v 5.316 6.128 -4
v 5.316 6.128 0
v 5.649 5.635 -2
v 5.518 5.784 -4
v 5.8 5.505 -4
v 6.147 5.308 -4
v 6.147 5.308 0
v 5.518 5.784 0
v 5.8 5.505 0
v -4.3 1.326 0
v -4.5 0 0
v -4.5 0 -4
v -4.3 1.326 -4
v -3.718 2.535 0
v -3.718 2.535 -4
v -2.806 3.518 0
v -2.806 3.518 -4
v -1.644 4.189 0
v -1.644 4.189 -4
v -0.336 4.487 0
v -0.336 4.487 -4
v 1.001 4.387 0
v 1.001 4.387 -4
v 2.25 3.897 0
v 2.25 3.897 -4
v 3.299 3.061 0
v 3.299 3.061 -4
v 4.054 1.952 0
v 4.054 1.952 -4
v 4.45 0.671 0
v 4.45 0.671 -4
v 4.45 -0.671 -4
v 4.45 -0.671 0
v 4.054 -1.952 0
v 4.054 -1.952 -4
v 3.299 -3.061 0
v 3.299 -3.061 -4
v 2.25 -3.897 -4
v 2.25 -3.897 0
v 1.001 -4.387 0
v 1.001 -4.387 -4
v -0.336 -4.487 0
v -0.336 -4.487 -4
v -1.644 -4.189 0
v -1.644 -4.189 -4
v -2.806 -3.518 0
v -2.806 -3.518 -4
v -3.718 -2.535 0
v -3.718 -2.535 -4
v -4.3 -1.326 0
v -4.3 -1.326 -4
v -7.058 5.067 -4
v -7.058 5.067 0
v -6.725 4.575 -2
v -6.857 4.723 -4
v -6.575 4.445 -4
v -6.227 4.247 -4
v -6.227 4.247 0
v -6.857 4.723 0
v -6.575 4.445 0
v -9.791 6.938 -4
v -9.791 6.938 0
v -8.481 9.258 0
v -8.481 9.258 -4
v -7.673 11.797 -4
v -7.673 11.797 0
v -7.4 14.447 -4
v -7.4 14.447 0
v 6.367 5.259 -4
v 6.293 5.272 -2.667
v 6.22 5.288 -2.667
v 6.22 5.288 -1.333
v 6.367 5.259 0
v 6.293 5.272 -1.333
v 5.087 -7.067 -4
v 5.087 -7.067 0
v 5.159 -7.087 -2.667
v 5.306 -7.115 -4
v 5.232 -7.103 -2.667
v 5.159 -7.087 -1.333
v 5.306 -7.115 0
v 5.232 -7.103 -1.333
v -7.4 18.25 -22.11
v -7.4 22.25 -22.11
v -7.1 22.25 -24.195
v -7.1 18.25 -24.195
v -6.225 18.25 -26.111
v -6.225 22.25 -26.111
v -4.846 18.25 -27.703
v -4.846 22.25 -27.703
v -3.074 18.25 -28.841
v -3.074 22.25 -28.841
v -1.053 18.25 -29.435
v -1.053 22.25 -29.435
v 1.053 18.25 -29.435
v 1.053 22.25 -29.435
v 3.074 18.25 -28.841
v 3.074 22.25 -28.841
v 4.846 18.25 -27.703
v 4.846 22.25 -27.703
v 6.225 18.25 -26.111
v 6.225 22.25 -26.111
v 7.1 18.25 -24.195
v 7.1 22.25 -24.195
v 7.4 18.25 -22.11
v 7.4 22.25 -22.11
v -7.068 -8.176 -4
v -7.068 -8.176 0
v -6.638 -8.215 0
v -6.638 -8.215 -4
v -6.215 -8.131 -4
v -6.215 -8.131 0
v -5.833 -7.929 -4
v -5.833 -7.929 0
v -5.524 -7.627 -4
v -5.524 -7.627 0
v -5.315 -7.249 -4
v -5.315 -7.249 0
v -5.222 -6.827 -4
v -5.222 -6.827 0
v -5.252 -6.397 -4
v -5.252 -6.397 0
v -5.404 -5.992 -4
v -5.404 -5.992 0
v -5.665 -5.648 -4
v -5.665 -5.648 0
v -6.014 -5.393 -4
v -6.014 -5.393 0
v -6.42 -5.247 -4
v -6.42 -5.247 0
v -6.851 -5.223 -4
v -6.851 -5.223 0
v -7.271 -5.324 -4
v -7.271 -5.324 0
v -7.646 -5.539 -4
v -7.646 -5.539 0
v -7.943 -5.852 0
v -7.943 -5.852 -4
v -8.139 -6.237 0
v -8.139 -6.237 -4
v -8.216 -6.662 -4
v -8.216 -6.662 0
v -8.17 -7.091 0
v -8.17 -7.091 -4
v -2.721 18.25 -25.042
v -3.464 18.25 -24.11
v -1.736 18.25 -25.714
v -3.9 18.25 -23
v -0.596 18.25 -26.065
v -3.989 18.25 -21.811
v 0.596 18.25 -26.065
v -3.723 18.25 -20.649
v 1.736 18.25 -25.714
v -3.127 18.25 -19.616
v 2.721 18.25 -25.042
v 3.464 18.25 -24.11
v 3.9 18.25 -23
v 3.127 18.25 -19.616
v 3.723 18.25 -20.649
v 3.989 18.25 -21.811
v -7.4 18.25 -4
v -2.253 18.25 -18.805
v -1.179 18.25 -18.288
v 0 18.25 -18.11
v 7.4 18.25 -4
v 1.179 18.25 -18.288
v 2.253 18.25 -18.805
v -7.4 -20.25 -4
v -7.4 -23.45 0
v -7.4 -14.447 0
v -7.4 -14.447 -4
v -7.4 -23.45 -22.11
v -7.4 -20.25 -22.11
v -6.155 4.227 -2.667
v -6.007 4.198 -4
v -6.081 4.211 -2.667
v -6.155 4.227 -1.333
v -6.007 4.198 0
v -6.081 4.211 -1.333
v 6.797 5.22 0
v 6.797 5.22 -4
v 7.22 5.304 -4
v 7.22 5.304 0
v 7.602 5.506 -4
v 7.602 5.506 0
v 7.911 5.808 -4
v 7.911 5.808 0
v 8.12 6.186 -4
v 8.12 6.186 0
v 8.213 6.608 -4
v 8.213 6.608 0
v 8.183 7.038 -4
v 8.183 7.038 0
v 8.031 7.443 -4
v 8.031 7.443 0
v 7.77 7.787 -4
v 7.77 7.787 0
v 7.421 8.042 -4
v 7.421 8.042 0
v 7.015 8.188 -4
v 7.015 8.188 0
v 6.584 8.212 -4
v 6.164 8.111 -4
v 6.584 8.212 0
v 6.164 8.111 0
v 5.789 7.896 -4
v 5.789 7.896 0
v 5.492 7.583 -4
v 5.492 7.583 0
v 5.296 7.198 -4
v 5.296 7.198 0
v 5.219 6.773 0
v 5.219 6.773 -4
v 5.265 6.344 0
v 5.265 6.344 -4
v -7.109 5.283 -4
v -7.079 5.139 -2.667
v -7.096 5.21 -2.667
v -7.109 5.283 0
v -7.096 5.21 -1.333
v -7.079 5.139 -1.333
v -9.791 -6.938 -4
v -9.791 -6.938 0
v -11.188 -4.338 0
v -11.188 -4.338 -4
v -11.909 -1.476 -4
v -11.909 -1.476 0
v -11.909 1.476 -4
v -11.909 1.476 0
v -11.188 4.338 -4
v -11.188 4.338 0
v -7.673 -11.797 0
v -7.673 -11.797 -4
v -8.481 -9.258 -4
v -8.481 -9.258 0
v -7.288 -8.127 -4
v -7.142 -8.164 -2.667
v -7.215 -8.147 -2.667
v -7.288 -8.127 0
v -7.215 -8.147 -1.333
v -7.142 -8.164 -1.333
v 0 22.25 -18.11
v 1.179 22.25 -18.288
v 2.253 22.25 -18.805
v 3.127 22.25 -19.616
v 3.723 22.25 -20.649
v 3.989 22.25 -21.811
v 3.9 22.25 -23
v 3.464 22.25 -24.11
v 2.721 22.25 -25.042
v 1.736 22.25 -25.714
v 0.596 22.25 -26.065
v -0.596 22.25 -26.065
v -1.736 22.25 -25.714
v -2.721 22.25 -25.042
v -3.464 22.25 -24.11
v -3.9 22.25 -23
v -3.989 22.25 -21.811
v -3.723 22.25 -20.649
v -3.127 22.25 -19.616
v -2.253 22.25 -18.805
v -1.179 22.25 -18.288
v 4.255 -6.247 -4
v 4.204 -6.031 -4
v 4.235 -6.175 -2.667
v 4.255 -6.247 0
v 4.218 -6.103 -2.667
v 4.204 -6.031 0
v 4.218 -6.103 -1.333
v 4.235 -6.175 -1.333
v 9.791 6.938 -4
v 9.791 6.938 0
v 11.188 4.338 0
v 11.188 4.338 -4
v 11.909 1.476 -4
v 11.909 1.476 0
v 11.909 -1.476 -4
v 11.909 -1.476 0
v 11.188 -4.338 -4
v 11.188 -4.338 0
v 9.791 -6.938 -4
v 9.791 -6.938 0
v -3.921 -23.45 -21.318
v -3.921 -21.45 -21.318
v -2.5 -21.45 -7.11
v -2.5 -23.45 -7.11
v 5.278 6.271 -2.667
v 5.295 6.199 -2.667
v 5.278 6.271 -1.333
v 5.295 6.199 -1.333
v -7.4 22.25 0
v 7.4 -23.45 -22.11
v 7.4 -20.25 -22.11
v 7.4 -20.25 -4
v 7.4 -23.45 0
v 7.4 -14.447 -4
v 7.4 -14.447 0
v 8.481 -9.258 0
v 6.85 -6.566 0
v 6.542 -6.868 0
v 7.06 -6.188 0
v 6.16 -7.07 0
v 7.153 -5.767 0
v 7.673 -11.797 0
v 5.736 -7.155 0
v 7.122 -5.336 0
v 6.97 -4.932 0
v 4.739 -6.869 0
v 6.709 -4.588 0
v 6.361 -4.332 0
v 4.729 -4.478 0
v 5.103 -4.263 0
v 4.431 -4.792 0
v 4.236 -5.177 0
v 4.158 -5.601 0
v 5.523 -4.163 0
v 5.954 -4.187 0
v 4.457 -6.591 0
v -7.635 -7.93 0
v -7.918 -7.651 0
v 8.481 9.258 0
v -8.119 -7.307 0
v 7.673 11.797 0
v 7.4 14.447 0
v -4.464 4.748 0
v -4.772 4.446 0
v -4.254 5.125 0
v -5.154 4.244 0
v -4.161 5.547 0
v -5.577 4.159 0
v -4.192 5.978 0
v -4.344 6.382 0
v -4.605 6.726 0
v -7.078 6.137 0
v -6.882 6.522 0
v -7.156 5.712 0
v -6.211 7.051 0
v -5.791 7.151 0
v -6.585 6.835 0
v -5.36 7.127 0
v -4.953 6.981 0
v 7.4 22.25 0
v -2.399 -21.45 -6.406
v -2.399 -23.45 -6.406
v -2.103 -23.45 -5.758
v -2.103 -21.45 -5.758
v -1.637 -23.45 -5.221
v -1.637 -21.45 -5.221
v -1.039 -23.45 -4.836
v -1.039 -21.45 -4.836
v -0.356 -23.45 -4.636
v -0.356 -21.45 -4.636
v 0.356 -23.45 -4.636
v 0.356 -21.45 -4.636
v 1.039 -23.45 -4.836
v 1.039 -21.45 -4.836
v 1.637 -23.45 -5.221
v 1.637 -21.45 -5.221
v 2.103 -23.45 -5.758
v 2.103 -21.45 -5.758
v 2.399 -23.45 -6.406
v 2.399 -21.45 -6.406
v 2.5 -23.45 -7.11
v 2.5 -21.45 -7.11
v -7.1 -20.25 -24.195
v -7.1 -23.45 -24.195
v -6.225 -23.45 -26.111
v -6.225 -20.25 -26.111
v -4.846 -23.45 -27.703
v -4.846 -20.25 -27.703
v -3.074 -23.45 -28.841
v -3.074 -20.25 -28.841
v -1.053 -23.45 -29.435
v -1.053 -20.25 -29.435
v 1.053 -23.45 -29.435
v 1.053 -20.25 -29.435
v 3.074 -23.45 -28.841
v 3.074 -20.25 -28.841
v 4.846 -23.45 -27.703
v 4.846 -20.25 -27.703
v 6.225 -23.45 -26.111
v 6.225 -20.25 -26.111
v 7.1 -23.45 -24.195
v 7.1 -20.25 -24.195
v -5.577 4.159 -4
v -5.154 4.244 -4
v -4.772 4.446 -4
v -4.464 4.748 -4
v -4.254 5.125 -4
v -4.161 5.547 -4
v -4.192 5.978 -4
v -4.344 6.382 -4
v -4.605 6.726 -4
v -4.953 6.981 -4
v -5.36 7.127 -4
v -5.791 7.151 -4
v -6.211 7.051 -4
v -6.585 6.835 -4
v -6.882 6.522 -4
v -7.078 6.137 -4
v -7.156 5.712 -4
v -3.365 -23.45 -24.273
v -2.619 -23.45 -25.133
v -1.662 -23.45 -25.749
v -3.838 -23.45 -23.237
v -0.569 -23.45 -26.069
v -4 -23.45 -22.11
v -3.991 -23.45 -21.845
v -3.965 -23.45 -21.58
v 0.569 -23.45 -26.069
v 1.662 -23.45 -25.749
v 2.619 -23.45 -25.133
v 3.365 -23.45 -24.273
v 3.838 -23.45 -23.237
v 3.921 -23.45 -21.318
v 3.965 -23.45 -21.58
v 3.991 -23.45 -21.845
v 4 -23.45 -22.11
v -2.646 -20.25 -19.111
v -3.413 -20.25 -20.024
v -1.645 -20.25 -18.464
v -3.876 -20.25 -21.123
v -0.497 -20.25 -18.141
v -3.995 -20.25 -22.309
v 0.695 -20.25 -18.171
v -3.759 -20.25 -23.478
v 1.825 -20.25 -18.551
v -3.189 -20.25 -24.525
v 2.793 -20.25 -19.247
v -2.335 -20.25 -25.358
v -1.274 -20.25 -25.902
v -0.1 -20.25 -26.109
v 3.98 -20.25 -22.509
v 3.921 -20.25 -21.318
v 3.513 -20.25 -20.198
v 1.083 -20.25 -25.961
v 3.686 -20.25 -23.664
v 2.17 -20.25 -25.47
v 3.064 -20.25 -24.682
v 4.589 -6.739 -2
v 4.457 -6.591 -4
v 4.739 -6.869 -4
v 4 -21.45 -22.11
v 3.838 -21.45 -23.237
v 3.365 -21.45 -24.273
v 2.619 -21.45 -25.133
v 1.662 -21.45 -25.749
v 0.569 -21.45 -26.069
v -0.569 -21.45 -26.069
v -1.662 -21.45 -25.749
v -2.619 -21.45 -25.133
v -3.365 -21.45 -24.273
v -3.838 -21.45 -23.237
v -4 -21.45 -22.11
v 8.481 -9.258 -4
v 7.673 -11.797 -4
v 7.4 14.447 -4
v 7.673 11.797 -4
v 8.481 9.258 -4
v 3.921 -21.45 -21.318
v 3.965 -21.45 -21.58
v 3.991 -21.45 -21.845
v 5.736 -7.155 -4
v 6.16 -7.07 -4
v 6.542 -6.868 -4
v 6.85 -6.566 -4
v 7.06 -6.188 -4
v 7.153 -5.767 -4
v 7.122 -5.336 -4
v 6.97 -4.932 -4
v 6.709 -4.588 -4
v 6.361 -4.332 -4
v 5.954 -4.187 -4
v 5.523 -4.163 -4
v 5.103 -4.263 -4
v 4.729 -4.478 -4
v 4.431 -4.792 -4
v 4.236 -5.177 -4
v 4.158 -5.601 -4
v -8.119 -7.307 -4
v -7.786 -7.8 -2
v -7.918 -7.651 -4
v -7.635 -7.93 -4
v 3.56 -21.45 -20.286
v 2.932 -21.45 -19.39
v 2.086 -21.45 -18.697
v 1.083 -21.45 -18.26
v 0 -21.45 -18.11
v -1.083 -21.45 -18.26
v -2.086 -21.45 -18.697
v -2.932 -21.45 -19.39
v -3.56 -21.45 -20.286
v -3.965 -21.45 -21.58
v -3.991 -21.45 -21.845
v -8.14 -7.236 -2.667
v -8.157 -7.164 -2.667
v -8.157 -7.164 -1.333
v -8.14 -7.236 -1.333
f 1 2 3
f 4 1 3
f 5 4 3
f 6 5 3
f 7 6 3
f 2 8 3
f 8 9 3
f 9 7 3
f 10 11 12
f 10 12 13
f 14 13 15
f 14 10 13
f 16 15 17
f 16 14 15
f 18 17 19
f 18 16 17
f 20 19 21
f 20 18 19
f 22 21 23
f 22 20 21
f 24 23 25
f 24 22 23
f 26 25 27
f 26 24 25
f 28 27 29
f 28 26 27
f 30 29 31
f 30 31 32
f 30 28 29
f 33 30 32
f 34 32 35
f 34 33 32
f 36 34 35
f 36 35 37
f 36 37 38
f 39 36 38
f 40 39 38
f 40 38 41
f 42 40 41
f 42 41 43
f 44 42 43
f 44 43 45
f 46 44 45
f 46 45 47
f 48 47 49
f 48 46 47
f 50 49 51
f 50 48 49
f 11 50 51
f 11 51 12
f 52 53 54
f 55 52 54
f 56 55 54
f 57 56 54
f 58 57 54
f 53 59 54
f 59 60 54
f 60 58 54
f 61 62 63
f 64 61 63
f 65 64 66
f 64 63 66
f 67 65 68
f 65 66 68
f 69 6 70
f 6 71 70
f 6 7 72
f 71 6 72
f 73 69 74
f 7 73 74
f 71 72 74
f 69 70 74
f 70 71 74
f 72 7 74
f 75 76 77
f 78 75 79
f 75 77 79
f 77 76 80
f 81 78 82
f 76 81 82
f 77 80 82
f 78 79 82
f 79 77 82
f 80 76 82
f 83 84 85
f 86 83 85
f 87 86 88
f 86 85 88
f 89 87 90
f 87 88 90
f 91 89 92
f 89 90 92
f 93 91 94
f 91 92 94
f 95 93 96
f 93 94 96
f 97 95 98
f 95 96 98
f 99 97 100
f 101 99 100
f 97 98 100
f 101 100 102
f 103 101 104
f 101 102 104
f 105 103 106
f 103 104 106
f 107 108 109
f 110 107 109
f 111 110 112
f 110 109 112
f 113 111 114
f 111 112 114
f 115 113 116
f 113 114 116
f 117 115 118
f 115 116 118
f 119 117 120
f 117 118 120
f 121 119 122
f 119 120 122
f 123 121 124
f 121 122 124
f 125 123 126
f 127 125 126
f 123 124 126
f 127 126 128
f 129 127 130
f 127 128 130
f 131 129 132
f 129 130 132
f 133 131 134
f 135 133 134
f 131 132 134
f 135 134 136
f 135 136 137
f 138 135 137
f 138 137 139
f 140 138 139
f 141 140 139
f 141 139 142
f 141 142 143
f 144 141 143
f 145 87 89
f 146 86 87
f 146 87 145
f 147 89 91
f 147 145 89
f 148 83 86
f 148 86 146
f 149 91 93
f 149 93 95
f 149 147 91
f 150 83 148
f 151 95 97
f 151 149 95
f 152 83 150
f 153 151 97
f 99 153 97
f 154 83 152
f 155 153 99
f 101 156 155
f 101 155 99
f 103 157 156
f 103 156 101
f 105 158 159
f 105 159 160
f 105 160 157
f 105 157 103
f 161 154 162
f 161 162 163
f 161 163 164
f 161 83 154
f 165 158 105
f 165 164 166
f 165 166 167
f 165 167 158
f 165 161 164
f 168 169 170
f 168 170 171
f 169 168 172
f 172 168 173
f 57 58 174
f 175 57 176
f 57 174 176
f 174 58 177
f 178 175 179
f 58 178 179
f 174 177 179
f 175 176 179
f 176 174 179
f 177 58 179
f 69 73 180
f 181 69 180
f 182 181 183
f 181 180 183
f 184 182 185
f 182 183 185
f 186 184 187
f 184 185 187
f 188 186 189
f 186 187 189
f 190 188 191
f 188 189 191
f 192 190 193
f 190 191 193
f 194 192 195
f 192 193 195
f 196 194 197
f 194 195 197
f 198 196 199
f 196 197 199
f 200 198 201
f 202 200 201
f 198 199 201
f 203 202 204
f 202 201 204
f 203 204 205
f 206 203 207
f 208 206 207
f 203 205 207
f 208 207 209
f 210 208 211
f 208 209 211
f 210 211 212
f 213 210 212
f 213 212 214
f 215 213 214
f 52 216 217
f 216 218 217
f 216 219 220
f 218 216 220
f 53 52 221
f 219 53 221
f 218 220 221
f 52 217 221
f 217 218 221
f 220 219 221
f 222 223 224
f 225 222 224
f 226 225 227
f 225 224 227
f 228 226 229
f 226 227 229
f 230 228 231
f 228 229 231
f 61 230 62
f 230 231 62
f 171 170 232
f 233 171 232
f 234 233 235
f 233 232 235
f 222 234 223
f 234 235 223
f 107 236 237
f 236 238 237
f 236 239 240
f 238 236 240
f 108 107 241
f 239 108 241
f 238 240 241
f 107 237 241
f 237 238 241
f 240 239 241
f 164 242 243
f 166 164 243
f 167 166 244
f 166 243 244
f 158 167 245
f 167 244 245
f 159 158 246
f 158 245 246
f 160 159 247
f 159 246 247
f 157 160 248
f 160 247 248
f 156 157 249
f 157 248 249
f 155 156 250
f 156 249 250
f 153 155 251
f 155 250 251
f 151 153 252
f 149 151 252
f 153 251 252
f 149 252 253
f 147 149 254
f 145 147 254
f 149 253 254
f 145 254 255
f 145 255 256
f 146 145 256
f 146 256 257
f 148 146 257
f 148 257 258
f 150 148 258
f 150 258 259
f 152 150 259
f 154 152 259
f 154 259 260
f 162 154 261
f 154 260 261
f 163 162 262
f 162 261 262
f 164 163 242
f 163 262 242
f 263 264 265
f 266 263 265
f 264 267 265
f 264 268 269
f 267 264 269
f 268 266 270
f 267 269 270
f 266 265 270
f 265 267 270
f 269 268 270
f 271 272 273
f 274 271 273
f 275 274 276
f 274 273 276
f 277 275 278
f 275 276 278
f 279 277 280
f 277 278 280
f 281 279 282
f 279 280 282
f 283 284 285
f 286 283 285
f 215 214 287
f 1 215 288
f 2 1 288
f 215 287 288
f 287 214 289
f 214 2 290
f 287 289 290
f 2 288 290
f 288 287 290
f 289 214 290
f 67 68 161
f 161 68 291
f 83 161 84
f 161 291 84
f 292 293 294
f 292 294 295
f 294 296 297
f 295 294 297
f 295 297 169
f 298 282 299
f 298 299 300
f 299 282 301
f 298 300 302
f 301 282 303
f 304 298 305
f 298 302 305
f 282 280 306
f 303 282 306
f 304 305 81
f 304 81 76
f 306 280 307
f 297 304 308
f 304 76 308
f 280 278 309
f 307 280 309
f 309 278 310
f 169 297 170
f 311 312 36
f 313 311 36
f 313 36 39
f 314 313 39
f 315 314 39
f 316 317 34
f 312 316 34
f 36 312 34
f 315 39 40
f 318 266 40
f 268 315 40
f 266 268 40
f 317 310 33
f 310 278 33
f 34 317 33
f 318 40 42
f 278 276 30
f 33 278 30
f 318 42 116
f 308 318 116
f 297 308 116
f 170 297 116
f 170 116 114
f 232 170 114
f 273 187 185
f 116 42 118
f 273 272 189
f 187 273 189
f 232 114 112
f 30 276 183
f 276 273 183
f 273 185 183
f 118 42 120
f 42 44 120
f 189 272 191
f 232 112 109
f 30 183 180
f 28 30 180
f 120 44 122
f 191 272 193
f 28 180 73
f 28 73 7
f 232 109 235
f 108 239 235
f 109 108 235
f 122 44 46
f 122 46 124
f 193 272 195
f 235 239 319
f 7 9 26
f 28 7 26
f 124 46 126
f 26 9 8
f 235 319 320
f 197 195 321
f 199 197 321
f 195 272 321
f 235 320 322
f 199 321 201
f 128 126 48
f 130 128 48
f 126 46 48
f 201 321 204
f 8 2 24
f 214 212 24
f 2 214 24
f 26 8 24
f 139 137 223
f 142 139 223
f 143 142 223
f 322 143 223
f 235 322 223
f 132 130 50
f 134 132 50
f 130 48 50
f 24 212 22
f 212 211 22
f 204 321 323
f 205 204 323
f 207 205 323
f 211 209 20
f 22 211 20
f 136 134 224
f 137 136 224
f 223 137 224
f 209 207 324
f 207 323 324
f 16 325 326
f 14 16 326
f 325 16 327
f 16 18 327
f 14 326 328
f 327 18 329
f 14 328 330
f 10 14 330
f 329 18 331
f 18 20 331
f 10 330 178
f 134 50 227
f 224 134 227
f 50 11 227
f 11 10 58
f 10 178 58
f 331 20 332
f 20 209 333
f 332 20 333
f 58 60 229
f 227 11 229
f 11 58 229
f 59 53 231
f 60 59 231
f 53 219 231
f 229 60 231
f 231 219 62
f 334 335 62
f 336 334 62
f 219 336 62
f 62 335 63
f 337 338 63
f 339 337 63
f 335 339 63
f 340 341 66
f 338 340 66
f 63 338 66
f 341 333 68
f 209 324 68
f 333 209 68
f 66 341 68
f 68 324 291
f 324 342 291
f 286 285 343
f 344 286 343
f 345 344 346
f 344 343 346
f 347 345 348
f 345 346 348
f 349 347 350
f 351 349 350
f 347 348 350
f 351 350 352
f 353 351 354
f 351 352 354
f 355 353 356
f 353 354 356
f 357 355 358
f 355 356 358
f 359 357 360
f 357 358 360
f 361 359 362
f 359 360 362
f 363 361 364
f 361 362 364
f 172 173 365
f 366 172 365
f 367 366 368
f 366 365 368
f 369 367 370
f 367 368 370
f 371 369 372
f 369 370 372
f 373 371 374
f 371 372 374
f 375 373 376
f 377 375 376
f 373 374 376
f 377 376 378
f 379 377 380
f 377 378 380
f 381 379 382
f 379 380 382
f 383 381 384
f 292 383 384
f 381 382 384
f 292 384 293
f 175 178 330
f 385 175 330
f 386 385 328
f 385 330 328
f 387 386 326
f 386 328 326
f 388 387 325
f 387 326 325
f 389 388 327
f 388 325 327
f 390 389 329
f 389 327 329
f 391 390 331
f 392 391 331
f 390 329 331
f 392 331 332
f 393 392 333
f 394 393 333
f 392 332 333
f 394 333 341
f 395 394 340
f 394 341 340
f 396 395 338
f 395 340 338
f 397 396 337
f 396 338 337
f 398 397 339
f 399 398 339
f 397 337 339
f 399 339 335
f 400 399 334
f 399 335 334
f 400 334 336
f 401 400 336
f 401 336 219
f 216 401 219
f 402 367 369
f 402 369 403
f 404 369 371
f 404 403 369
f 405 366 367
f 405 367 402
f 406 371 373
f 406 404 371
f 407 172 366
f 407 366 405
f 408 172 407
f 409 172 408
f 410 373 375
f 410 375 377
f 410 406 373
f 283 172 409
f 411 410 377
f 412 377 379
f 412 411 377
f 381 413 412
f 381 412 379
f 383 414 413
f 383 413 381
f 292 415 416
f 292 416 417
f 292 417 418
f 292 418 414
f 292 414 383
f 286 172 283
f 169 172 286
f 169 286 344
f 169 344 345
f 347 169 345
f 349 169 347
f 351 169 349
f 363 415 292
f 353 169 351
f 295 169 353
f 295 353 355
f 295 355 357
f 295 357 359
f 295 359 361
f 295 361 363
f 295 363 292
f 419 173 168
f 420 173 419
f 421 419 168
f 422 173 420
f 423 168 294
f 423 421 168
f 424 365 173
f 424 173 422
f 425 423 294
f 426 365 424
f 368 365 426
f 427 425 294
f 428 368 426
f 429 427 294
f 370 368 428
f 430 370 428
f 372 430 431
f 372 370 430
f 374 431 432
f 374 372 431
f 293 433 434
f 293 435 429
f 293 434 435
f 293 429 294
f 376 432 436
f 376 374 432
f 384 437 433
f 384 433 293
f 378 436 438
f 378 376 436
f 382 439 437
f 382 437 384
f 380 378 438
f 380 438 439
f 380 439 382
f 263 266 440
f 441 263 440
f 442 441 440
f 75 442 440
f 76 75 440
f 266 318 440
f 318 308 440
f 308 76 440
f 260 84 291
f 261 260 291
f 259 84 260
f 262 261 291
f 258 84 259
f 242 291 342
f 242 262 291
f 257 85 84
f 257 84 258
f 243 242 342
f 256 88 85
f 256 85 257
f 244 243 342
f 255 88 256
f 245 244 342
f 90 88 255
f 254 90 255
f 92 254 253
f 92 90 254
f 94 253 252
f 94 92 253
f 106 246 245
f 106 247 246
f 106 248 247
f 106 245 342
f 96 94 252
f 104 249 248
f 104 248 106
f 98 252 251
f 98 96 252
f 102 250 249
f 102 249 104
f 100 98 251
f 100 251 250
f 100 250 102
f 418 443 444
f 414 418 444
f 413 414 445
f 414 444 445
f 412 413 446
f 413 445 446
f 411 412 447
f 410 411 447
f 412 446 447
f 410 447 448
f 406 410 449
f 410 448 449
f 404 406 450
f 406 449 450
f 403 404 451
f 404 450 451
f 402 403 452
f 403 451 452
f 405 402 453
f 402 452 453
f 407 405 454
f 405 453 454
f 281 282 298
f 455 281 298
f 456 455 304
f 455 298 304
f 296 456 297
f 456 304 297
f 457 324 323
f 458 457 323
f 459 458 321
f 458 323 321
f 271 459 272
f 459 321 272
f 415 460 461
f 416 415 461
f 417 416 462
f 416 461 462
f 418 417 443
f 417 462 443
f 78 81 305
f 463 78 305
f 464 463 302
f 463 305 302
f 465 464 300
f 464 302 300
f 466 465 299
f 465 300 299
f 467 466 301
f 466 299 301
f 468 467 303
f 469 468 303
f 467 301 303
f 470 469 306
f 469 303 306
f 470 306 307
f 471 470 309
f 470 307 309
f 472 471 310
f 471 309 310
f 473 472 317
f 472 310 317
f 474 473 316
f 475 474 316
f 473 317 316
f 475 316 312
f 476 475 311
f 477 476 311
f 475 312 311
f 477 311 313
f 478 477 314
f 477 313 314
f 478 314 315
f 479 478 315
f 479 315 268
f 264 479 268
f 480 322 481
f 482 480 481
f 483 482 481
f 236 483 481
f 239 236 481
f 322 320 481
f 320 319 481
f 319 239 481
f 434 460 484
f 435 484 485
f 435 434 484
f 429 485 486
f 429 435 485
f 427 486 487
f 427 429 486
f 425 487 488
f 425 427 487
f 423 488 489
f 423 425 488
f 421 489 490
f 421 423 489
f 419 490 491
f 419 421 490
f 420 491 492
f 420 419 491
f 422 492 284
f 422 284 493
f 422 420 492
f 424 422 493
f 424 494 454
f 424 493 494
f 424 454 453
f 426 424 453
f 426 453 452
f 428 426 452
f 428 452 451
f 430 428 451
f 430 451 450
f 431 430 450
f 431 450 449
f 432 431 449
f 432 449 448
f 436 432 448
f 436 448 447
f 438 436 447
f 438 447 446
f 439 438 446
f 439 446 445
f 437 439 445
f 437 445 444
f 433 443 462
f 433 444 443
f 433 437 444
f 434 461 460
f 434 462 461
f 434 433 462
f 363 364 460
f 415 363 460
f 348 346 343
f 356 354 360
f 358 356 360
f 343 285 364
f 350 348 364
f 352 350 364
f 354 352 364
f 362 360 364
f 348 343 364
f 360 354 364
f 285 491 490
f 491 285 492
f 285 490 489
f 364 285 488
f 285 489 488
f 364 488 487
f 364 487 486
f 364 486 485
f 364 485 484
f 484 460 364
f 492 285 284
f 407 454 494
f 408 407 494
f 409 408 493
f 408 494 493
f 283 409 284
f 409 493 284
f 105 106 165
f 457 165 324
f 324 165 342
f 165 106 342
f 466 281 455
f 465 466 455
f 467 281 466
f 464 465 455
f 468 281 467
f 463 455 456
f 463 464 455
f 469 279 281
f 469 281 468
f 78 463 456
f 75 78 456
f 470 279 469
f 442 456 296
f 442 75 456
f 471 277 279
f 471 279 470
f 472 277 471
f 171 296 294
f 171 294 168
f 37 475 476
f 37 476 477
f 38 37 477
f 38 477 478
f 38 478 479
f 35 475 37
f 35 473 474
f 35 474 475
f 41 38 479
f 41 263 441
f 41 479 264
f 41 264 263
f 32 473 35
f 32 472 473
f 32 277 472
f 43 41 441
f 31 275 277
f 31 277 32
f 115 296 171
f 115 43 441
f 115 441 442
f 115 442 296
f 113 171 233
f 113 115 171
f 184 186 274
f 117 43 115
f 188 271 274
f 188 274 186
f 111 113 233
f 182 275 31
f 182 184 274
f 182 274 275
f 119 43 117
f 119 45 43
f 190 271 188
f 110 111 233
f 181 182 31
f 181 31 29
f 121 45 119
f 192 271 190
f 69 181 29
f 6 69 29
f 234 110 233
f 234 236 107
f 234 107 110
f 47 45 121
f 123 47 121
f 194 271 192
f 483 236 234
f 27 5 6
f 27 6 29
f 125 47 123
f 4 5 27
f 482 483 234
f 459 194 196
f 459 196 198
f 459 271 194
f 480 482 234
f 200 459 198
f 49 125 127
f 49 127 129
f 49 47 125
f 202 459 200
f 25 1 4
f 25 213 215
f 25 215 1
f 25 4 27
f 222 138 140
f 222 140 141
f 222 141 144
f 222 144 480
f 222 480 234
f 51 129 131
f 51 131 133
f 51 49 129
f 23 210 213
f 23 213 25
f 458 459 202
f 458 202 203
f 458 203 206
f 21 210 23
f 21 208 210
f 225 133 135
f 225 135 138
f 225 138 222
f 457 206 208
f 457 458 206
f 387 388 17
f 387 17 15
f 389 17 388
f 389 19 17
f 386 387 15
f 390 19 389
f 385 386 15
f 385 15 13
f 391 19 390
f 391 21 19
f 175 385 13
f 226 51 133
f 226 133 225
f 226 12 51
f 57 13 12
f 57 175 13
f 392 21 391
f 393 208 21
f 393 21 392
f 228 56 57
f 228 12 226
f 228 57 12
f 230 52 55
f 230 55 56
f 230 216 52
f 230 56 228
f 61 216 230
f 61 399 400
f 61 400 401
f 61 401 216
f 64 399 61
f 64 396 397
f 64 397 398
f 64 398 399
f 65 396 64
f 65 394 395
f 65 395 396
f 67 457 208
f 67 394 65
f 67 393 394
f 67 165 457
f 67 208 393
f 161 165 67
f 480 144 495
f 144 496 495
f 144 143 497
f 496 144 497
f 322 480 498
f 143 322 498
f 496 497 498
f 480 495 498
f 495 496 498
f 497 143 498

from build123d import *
from build123d.topology import SkipClean

# Parameters (mm, degrees)
BOSS_EXTRUDE1_OUTLINE_R = 4.5
BOSS_EXTRUDE1_DEPTH     = 4
BOSS_EXTRUDE2_START     = -2
BOSS_EXTRUDE2_DEPTH     = 1.2
BOSS_EXTRUDE3_DEPTH     = 2
BOSS_EXTRUDE4_DEPTH     = 2
BOSS_EXTRUDE5_DEPTH     = 2
CUT_EXTRUDE3_DEPTH      = 1.2
SKETCH12_R              = 4
CUT_EXTRUDE4_DEPTH      = 4
SKETCH8_R               = 1.5
CUT_EXTRUDE1_DEPTH      = 56.707591784
CUT_EXTRUDE2_START      = -15
SKETCH9_R               = 4
CUT_EXTRUDE2_DEPTH      = 15


# Read off the part's stored shape, not the designer's step: Boss-Extrude1
with BuildPart() as part:
    # Boss-Extrude1 outline → Boss-Extrude1 (new body)
    with BuildSketch(Plane(origin=(0, 0, 0), x_dir=(-1, 0, 0), z_dir=(0, 0, -1))):
        with BuildLine():
            Line((-7.4, 23.45), (-7.4, 14.446692543))
            ThreePointArc((-7.4, 14.446692543), (-8.012107067, 10.506844717), (-9.790721745, 6.938426891))
            ThreePointArc((-9.790721745, 6.938426891), (-12, 0), (-9.790721745, -6.938426891))
            ThreePointArc((-9.790721745, -6.938426891), (-8.012107067, -10.506844717), (-7.4, -14.446692543))
            Line((-7.4, -14.446692543), (-7.4, -23.45))
            Line((-7.4, -23.45), (7.4, -23.45))
            Line((7.4, -23.45), (7.4, -14.446692543))
            ThreePointArc((7.4, -14.446692543), (8.012107067, -10.506844717), (9.790721745, -6.938426891))
            ThreePointArc((9.790721745, -6.938426891), (12, 0), (9.790721745, 6.938426891))
            ThreePointArc((9.790721745, 6.938426891), (8.012107067, 10.506844717), (7.4, 14.446692543))
            Line((7.4, 14.446692543), (7.4, 23.45))
            Line((7.4, 23.45), (-7.4, 23.45))
        make_face()
        with BuildLine():
            add(Edge.make_bspline(
                [(-5.08661691, -7.066518716), (-5.158505421, -7.088491281), (-5.232048751, -7.104749218), (-5.306303966, -7.11531731)],
                knots=[0, 0, 0, 0, 0.301273824, 0.301273824, 0.301273824, 0.301273824], degree=3))
            ThreePointArc((-5.306303966, -7.11531731), (-6.708944151, -4.587692504), (-4.204222203, -6.030833041))
            add(Edge.make_bspline(
                [(-4.204222203, -6.030833041), (-4.215901752, -6.103480441), (-4.232873947, -6.175405229), (-4.255236782, -6.246594027)],
                knots=[0.717333192, 0.717333192, 0.717333192, 0.717333192, 1, 1, 1, 1], degree=3))
            add(Edge.make_bspline(
                [(-4.255236782, -6.246594027), (-4.333126561, -6.431712412), (-4.447649884, -6.599923699), (-4.729572884, -6.878207782), (-4.900435719, -6.991204718), (-5.08661691, -7.066518716)],
                knots=[0, 0, 0, 0, 0.5, 0.5, 1, 1, 1, 1], degree=3))
        make_face(mode=Mode.SUBTRACT)
        with BuildLine():
            add(Edge.make_bspline(
                [(7.28775176, -8.127178888), (7.215863249, -8.149151453), (7.14231992, -8.16540939), (7.068064705, -8.175977482)],
                knots=[0, 0, 0, 0, 0.301273824, 0.301273824, 0.301273824, 0.301273824], degree=3))
            ThreePointArc((7.068064705, -8.175977482), (5.665424519, -5.648352676), (8.170146468, -7.091493213))
            add(Edge.make_bspline(
                [(8.170146468, -7.091493213), (8.158466918, -7.164140613), (8.141494724, -7.236065401), (8.119131889, -7.307254199)],
                knots=[0.717333192, 0.717333192, 0.717333192, 0.717333192, 1, 1, 1, 1], degree=3))
            add(Edge.make_bspline(
                [(8.119131889, -7.307254199), (8.04124211, -7.492372584), (7.926718787, -7.66058387), (7.644795787, -7.938867954), (7.473932951, -8.05186489), (7.28775176, -8.127178888)],
                knots=[0, 0, 0, 0, 0.5, 0.5, 1, 1, 1, 1], degree=3))
        make_face(mode=Mode.SUBTRACT)
        with BuildLine():
            add(Edge.make_bspline(
                [(-6.147277082, 5.307849955), (-6.219165593, 5.28587739), (-6.292708922, 5.269619453), (-6.366964138, 5.259051361)],
                knots=[0, 0, 0, 0, 0.301273824, 0.301273824, 0.301273824, 0.301273824], degree=3))
            ThreePointArc((-6.366964138, 5.259051361), (-7.769604322, 7.786676168), (-5.264882374, 6.34353563))
            add(Edge.make_bspline(
                [(-5.264882374, 6.34353563), (-5.276561924, 6.27088823), (-5.293534119, 6.198963441), (-5.315896954, 6.127774644)],
                knots=[0.717333192, 0.717333192, 0.717333192, 0.717333192, 1, 1, 1, 1], degree=3))
            add(Edge.make_bspline(
                [(-5.315896954, 6.127774644), (-5.393786733, 5.942656259), (-5.508310056, 5.774444972), (-5.790233055, 5.496160889), (-5.961095891, 5.383163953), (-6.147277082, 5.307849955)],
                knots=[0, 0, 0, 0, 0.5, 0.5, 1, 1, 1, 1], degree=3))
        make_face(mode=Mode.SUBTRACT)
        Circle(BOSS_EXTRUDE1_OUTLINE_R, mode=Mode.SUBTRACT)
        with BuildLine():
            add(Edge.make_bspline(
                [(6.227091589, 4.247189783), (6.155203078, 4.225217218), (6.081659748, 4.208959281), (6.007404533, 4.198391189)],
                knots=[0, 0, 0, 0, 0.301273824, 0.301273824, 0.301273824, 0.301273824], degree=3))
            ThreePointArc((6.007404533, 4.198391189), (4.604764348, 6.726015995), (7.109486296, 5.282875458))
            add(Edge.make_bspline(
                [(7.109486296, 5.282875458), (7.097806747, 5.210228058), (7.080834552, 5.13830327), (7.058471717, 5.067114472)],
                knots=[0.717333192, 0.717333192, 0.717333192, 0.717333192, 1, 1, 1, 1], degree=3))
            add(Edge.make_bspline(
                [(7.058471717, 5.067114472), (6.980581938, 4.881996087), (6.866058615, 4.7137848), (6.584135615, 4.435500717), (6.41327278, 4.322503781), (6.227091589, 4.247189783)],
                knots=[0, 0, 0, 0, 0.5, 0.5, 1, 1, 1, 1], degree=3))
        make_face(mode=Mode.SUBTRACT)
    extrude(amount=BOSS_EXTRUDE1_DEPTH)

    # Sketch4 → Boss-Extrude2 (add)
    with BuildSketch(Plane(origin=(0, -23.45, 0), x_dir=(-1, 0, 0), z_dir=(0, -1, 0)).offset(BOSS_EXTRUDE2_START)):
        with BuildLine():
            Line((-7.4, 4), (-7.4, 22.110096084))
            ThreePointArc((-7.4, 22.110096084), (0, 29.510096084), (7.4, 22.110096084))
            Line((7.4, 22.110096084), (7.4, 4))
            Line((7.4, 4), (-7.4, 4))
        make_face()
    boss_extrude2 = extrude(amount=-BOSS_EXTRUDE2_DEPTH)

    # Mirror1: Boss-Extrude2 across plane
    add(boss_extrude2.mirror(Plane.ZX))

    # Sketch6 → Boss-Extrude3 (add)
    with BuildSketch(Plane.XZ.offset(21.45)):
        with BuildLine():
            ThreePointArc((-7.4, -22.110096084), (0, -29.510096084), (7.4, -22.110096084))
            Line((7.4, -22.110096084), (7.4, -4))
            Line((7.4, -4), (-7.4, -4))
            Line((-7.4, -4), (-7.4, -22.110096084))
        make_face()
        with BuildLine():
            Line((-3.920792079, -21.318016876), (-2.5, -7.110096084))
            ThreePointArc((-2.5, -7.110096084), (0, -4.610096084), (2.5, -7.110096084))
            Line((2.5, -7.110096084), (3.920792079, -21.318016876))
            ThreePointArc((3.920792079, -21.318016876), (3.980148761, -21.712081207), (4, -22.110096084))
            ThreePointArc((4, -22.110096084), (0, -26.110096084), (-4, -22.110096084))
            ThreePointArc((-4, -22.110096084), (-3.980148761, -21.712081207), (-3.920792079, -21.318016876))
        make_face(mode=Mode.SUBTRACT)
    extrude(amount=BOSS_EXTRUDE3_DEPTH)

    # Sketch7 → Boss-Extrude4 (add)
    with BuildSketch(Plane(origin=(0, 21.45, 0), x_dir=(1, 0, 0), z_dir=(0, 1, 0))):
        with BuildLine():
            Line((-7.4, 22.110096084), (-7.4, 4))
            Line((-7.4, 4), (7.4, 4))
            Line((7.4, 4), (7.4, 22.110096084))
            ThreePointArc((7.4, 22.110096084), (0, 29.510096084), (-7.4, 22.110096084))
        make_face()
    extrude(amount=BOSS_EXTRUDE4_DEPTH)

    # Sketch10 → Boss-Extrude5 (add)
    with BuildSketch(Plane.XZ.offset(-20.25)):
        with BuildLine():
            Line((7.4, -4), (-7.4, -4))
            Line((-7.4, -4), (-7.4, -22.110096084))
            ThreePointArc((-7.4, -22.110096084), (0, -29.510096084), (7.4, -22.110096084))
            Line((7.4, -22.110096084), (7.4, -4))
        make_face()
    extrude(amount=BOSS_EXTRUDE5_DEPTH)

    # Sketch11 → Cut-Extrude3 (cut)
    with BuildSketch(Plane(origin=(0, 23.45, 0), x_dir=(1, 0, 0), z_dir=(0, 1, 0))):
        with BuildLine():
            Line((-7.4, 0), (7.4, 0))
            Line((7.4, 0), (7.4, 22.110096084))
            ThreePointArc((7.4, 22.110096084), (0, 29.510096084), (-7.4, 22.110096084))
            Line((-7.4, 22.110096084), (-7.4, 0))
        make_face()
    extrude(amount=-CUT_EXTRUDE3_DEPTH, mode=Mode.SUBTRACT)

    # Sketch12 → Cut-Extrude4 (cut)
    with BuildSketch(Plane(origin=(0, 22.25, 0), x_dir=(1, 0, 0), z_dir=(0, 1, 0))):
        with Locations(Location((0, 22.110096084, 0), (0, 0, 270))):
            Circle(SKETCH12_R)
    extrude(amount=-CUT_EXTRUDE4_DEPTH, mode=Mode.SUBTRACT)

    # Sketch8 → Cut-Extrude1 (cut, through all)
    with BuildSketch(Plane.XZ.offset(23.45)):
        with Locations(Location((0, -22.110096084, 0), (0, 0, 270))):
            Circle(SKETCH8_R)
    extrude(amount=-CUT_EXTRUDE1_DEPTH, mode=Mode.SUBTRACT)

    # Sketch9 → Cut-Extrude2 (cut)
    with SkipClean():  # the faces are left unmerged after this step: merging them gives an invalid solid
        with BuildSketch(Plane.XZ.offset(23.45).offset(CUT_EXTRUDE2_START)):
            with Locations(Location((0, -22.110096084, 0), (0, 0, 11.421186275))):
                Circle(SKETCH9_R)
        extrude(amount=CUT_EXTRUDE2_DEPTH, mode=Mode.SUBTRACT)


solid = part.part
